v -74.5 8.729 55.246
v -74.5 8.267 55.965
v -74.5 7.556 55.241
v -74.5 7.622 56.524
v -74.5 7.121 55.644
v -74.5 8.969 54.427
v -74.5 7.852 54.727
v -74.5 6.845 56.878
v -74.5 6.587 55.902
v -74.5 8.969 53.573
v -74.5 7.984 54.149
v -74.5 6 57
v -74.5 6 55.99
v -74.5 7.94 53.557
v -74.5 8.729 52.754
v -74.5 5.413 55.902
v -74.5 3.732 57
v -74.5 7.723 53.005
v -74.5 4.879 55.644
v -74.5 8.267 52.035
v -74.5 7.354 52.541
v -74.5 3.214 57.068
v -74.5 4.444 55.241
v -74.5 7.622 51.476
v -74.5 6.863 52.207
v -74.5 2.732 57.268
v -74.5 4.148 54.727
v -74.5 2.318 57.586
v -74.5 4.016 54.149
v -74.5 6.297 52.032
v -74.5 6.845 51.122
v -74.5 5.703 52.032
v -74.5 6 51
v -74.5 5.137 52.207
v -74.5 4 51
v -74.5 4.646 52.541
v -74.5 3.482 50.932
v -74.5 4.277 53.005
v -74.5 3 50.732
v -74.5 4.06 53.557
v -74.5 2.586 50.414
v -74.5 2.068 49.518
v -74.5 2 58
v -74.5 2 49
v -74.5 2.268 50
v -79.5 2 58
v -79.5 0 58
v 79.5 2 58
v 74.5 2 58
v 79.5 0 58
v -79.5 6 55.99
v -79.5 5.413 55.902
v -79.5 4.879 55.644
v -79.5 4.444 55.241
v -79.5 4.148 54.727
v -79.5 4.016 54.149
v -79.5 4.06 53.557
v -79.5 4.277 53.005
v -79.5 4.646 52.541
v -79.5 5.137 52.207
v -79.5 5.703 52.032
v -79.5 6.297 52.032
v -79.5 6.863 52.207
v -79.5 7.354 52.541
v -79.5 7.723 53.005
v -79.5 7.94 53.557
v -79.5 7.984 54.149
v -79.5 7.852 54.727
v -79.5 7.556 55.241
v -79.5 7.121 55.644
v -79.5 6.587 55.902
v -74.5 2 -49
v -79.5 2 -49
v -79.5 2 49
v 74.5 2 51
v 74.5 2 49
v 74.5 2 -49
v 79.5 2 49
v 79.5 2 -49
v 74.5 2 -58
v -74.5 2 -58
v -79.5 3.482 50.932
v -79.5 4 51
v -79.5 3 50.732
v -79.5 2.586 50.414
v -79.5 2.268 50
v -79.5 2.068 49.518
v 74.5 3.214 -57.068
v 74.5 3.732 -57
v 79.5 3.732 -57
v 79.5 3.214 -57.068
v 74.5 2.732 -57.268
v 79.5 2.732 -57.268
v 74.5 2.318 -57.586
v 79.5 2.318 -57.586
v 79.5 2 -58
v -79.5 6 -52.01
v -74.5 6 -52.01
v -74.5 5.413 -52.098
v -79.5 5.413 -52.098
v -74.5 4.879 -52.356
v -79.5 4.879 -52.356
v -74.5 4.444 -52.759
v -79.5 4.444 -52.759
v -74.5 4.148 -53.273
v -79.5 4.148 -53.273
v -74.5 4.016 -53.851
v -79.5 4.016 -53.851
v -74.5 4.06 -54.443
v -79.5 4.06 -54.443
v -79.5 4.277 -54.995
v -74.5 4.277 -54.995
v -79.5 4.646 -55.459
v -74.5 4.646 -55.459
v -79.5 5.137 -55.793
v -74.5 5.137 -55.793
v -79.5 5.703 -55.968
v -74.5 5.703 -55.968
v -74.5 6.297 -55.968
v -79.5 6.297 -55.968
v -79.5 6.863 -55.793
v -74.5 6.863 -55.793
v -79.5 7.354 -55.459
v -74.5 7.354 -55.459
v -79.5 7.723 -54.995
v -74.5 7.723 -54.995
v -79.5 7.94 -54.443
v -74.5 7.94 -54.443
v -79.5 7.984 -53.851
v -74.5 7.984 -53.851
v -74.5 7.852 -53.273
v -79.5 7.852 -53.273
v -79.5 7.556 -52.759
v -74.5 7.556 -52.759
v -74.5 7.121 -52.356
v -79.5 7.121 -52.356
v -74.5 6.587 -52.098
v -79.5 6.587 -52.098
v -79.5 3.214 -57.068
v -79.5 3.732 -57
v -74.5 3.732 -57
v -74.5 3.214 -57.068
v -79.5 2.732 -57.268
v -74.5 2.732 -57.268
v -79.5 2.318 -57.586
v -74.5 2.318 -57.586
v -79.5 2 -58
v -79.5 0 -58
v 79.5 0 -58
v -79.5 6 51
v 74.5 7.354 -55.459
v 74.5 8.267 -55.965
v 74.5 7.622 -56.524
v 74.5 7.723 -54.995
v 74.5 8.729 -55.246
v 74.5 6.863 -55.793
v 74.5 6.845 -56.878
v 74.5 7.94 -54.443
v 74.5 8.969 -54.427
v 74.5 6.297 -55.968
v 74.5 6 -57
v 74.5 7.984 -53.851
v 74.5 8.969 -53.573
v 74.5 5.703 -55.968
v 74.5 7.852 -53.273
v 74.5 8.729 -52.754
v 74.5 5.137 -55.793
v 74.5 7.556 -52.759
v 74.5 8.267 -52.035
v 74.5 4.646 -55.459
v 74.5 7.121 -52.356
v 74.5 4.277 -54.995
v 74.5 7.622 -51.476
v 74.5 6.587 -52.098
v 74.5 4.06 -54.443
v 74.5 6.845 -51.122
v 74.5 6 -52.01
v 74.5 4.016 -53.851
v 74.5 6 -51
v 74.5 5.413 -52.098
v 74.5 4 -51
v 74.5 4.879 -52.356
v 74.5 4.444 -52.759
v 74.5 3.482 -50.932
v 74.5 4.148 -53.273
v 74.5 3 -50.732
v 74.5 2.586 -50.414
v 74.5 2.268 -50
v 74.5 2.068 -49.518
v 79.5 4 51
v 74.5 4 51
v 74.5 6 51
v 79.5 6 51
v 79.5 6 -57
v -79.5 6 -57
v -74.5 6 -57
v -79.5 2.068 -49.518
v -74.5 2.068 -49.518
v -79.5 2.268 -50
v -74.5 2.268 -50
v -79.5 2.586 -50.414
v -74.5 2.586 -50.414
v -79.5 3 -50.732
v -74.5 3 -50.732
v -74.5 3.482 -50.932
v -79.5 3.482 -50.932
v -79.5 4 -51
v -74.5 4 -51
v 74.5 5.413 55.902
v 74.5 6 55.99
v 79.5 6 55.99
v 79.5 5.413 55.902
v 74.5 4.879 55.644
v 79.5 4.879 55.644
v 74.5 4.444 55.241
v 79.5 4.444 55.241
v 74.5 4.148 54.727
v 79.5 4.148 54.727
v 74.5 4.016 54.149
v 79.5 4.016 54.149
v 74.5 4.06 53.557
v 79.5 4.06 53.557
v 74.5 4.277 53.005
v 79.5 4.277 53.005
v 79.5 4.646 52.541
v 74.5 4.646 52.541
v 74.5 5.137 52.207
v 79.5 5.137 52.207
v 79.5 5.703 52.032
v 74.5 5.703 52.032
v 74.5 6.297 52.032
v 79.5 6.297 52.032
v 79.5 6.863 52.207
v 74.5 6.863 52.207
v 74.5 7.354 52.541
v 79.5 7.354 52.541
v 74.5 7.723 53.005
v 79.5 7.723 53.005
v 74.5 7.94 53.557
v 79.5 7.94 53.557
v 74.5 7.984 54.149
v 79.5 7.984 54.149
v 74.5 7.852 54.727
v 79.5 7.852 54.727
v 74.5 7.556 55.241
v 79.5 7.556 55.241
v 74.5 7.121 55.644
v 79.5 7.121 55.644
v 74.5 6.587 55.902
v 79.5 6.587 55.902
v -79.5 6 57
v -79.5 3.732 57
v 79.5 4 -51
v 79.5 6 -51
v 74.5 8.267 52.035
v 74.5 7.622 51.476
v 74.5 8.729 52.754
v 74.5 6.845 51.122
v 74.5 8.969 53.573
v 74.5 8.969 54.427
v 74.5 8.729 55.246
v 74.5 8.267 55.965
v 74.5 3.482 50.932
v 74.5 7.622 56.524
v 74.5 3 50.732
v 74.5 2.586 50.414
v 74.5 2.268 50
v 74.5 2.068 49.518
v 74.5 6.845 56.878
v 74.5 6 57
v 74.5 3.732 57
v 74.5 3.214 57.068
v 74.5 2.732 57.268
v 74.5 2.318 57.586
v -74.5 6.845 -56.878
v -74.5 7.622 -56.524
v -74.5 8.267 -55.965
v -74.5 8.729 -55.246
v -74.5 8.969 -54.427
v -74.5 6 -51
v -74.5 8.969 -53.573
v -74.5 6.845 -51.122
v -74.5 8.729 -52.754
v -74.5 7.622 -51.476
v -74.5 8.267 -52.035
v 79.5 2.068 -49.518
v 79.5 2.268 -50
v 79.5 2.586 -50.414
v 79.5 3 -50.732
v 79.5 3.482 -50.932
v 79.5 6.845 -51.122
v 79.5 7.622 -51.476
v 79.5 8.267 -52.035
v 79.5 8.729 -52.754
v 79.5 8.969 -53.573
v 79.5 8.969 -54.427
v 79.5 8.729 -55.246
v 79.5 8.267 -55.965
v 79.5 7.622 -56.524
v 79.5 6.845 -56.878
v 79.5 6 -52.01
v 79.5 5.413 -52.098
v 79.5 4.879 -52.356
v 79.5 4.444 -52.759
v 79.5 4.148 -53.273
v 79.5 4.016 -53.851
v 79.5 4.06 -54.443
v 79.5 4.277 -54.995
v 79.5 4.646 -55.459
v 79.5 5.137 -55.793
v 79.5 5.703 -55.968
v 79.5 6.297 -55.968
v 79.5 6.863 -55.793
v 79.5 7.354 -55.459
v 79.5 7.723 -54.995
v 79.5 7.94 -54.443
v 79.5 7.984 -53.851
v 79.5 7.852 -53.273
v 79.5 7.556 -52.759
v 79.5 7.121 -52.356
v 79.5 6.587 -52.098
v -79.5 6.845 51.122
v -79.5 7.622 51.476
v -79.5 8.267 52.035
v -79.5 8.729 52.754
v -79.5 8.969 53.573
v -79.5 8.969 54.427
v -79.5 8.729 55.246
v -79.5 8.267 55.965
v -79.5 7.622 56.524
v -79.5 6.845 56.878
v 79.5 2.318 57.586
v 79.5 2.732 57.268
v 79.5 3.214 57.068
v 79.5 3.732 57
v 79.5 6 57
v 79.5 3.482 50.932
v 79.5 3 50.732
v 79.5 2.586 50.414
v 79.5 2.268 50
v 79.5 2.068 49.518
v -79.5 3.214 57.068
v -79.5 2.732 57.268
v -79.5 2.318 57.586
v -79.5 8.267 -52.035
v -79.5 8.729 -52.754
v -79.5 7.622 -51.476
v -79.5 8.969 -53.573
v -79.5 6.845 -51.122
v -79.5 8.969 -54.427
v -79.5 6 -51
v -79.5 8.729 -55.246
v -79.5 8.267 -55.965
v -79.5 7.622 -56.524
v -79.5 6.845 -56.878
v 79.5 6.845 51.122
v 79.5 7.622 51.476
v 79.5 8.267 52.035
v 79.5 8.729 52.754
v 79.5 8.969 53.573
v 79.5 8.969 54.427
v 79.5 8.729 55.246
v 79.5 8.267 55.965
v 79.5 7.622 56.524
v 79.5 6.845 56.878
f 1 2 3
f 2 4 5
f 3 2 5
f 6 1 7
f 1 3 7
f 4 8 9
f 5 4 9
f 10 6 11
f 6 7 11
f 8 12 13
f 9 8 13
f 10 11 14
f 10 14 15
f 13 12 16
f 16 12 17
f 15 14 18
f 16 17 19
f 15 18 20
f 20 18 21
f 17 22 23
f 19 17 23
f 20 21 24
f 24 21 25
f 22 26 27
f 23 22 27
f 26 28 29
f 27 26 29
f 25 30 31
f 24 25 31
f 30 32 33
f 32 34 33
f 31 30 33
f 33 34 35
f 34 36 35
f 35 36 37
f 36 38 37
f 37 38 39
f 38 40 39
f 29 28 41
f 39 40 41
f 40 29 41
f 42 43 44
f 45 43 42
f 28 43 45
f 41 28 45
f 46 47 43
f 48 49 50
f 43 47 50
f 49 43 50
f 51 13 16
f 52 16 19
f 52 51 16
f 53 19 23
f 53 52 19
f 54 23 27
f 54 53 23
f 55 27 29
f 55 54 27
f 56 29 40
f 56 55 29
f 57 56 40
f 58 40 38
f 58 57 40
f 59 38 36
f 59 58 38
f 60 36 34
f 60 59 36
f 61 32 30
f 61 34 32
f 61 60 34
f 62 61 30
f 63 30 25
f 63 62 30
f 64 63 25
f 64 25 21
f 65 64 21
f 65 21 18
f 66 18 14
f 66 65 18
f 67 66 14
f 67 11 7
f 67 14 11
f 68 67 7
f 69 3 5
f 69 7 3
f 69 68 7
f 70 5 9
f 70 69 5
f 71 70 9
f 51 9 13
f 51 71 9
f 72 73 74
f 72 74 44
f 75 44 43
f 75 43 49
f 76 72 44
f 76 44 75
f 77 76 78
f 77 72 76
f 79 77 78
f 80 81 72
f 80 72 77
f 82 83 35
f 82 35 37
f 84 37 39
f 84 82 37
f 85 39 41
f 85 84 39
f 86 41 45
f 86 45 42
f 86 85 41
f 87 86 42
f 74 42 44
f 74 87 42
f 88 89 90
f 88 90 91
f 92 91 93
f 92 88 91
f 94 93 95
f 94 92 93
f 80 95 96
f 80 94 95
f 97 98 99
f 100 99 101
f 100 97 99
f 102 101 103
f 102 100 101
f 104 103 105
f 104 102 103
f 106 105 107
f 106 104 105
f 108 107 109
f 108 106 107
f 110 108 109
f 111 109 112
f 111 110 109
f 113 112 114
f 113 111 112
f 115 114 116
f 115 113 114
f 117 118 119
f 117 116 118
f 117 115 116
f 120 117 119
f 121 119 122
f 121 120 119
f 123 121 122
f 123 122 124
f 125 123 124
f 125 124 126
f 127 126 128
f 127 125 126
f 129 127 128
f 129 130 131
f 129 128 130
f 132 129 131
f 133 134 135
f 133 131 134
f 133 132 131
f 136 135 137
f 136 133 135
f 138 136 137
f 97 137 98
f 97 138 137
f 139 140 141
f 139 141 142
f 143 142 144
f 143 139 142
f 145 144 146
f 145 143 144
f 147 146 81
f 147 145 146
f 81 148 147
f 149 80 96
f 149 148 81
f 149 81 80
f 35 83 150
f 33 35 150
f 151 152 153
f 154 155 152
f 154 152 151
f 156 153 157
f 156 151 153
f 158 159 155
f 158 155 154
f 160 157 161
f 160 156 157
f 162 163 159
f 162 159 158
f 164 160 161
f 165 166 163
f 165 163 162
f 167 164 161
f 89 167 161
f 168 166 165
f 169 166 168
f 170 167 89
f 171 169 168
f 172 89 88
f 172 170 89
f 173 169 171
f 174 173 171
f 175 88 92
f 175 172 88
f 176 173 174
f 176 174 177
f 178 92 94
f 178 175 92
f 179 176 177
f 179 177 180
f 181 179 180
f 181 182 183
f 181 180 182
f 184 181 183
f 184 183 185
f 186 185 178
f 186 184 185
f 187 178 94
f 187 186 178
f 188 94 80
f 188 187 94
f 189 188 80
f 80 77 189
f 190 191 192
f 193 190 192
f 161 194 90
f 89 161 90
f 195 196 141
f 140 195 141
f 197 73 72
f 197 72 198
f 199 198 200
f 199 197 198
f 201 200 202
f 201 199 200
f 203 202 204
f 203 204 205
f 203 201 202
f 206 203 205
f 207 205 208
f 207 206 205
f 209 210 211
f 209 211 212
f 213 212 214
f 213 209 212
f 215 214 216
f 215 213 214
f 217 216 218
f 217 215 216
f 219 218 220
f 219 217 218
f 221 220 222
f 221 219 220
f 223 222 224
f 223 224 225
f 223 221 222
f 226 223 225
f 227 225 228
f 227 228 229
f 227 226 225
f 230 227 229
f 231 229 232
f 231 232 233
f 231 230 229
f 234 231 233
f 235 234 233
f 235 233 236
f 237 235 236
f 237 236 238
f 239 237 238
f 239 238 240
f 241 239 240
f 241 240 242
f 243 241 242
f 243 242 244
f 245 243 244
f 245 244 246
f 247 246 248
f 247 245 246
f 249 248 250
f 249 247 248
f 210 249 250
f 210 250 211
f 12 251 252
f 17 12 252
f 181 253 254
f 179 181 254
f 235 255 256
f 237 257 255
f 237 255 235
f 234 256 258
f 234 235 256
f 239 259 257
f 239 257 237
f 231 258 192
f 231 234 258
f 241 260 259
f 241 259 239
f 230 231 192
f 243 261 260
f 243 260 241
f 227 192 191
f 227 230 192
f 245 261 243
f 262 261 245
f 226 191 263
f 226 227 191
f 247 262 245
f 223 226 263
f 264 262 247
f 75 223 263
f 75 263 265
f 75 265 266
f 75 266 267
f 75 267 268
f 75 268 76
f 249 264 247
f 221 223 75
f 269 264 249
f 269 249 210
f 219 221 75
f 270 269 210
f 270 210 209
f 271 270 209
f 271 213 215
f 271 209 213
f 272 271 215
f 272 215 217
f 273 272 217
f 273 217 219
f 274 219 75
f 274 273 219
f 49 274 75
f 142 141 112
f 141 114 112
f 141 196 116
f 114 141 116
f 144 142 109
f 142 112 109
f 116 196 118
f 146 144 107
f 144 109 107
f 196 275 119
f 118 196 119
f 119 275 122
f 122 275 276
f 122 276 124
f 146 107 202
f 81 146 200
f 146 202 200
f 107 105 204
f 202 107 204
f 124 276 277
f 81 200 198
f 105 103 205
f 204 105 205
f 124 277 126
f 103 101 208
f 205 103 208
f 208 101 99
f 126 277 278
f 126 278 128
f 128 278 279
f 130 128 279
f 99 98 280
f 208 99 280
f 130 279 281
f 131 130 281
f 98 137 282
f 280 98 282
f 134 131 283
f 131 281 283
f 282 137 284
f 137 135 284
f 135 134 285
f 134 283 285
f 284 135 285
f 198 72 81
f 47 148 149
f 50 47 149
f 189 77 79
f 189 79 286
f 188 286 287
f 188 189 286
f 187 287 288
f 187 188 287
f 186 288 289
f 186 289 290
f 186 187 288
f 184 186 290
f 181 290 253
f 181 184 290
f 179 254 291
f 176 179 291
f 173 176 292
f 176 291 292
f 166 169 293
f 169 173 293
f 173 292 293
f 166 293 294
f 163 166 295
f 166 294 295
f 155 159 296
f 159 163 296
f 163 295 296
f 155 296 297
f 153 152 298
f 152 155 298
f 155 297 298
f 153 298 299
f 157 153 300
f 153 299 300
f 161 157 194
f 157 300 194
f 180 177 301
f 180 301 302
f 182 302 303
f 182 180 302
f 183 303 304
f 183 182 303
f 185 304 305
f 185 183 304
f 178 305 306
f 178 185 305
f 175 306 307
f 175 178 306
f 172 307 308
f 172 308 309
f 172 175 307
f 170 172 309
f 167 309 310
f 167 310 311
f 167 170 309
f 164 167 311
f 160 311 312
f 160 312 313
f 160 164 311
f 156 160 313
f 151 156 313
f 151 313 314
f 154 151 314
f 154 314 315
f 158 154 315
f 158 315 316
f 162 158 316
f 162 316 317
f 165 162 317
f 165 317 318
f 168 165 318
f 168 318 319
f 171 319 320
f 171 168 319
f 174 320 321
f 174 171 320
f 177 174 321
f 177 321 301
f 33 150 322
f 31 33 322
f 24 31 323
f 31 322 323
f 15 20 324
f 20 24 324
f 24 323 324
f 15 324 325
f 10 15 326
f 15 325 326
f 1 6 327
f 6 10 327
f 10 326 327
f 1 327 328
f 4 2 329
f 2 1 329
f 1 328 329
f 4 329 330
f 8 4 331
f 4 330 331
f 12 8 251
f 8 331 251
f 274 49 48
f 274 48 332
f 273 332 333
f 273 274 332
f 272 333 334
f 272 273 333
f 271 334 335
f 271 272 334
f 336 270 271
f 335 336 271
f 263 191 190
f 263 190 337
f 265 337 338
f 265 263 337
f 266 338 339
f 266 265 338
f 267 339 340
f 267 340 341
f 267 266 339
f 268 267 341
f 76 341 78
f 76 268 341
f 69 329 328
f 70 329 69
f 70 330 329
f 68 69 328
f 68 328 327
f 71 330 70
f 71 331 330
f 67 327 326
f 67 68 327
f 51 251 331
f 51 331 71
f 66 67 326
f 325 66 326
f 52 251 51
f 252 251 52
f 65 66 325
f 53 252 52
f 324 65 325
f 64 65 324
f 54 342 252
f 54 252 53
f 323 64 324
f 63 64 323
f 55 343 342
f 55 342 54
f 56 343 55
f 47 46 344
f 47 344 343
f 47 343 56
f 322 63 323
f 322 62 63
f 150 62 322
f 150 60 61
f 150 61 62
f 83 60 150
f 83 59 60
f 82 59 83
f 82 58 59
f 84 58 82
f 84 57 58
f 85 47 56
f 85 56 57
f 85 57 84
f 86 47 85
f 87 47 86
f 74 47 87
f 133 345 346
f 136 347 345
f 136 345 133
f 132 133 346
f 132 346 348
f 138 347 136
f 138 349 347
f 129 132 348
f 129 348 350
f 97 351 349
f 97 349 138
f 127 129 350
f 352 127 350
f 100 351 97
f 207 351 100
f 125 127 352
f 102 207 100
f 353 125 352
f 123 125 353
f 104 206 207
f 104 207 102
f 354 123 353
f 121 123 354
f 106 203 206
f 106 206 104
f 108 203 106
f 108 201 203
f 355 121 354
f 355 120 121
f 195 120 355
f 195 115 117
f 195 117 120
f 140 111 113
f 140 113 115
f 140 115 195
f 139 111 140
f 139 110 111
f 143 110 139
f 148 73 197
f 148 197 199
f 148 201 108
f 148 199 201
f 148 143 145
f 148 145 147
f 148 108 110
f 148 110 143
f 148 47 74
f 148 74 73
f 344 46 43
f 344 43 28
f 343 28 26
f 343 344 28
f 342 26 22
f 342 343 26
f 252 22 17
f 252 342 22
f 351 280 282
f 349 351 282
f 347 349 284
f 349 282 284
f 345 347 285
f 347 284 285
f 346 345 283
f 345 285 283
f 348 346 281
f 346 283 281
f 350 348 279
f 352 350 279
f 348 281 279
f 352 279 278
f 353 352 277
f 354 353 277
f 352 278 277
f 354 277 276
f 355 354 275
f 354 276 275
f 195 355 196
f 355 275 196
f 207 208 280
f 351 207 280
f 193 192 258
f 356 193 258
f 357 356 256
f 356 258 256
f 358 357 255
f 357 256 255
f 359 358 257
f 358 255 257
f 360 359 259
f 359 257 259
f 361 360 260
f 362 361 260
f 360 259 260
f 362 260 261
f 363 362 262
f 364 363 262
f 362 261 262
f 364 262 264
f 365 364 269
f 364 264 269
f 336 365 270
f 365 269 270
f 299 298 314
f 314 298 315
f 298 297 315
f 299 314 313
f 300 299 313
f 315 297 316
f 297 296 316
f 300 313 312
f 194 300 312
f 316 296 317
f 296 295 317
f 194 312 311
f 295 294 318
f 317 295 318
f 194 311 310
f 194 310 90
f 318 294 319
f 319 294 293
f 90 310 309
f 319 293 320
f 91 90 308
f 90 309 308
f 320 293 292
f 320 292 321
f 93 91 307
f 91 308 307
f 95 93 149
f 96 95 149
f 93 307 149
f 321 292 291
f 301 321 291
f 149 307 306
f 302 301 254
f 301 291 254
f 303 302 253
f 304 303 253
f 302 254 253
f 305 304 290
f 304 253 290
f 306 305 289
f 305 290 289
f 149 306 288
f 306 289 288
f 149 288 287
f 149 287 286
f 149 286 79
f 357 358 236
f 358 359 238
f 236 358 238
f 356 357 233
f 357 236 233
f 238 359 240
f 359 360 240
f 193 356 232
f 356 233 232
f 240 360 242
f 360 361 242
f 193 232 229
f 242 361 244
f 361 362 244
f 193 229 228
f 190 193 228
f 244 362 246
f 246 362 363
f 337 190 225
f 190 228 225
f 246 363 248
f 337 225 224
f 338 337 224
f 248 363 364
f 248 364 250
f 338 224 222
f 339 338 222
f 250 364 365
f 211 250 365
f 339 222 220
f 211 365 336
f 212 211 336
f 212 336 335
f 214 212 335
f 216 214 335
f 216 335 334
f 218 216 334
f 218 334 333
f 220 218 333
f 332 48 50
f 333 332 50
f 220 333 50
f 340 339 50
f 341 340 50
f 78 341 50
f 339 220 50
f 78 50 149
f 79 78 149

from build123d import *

# Parameters (mm, degrees)
SKETCH_1_W          = 159
SKETCH_1_H          = 116
EXTRUDE_1_DEPTH     = 2
SKETCH_3_R          = 1.99
EXTRUDE_3_DEPTH     = 79.5
SKETCH_4_W          = 149
SKETCH_4_H          = 7
CUT_EXTRUDE_2_DEPTH = 79.5
FILLET_3_R          = 2


with BuildPart() as part:
    # 草图1 → 凸台-拉伸1 (new body)
    with BuildSketch(Plane(origin=(0, 0, 0), x_dir=(1, 0, 0), z_dir=(0, 1, 0))):
        Rectangle(SKETCH_1_W, SKETCH_1_H)
    extrude(amount=EXTRUDE_1_DEPTH)

    # 草图3 → 凸台-拉伸3 (add, symmetric)
    # profile 1 of 2: a face of its own
    with BuildSketch(Plane(origin=(0, 0, 0), x_dir=(0, 0, -1), z_dir=(1, 0, 0))):
        with BuildLine():
            Line((-57, 6), (-57, 2))
            Line((-57, 2), (-51, 2))
            Line((-51, 2), (-51, 6))
            ThreePointArc((-51, 6), (-54, 9), (-57, 6))
        make_face()
        with Locations(Location((-54, 6, 0), (0, 0, 180))):
            Circle(SKETCH_3_R, mode=Mode.SUBTRACT)
    # profile 2 of 2: a face of its own
    with BuildSketch(Plane(origin=(0, 0, 0), x_dir=(0, 0, -1), z_dir=(1, 0, 0))):
        with BuildLine():
            Line((51, 2), (51, 6))
            ThreePointArc((51, 6), (54, 9), (57, 6))
            Line((57, 6), (57, 2))
            Line((57, 2), (51, 2))
        make_face()
        with Locations(Location((54, 6, 0), (0, 0, 180))):
            Circle(SKETCH_3_R, mode=Mode.SUBTRACT)
    extrude(amount=EXTRUDE_3_DEPTH, both=True)

    # 草图4 → 切除-拉伸2 (cut, symmetric)
    with BuildSketch(Plane.XY):
        with Locations((0, 5.5)):
            Rectangle(SKETCH_4_W, SKETCH_4_H)
    extrude(amount=CUT_EXTRUDE_2_DEPTH, both=True, mode=Mode.SUBTRACT)

    # 圆角3
    # the kernel refuses this fillet: 2 mm, written as the material it adds along each edge
    with BuildSketch(Plane(origin=(74.5, 2, 57), x_dir=(0, 1, 0), z_dir=(1, 0, 0))) as fillet_3_piece_1:
        with BuildLine():
            CenterArc((1.732050808, 2), FILLET_3_R, 210, 60)
            Line((0, 1), (-0.034641016, 0.98))
            ThreePointArc((-0.034641016, 0.98), (-0.04, 0.5), (-0.04, 0))
            Line((-0.04, 0), (0, -0.04))
            Line((0, -0.04), (1.732050808, -0.04))
            Line((1.732050808, -0.04), (1.732050808, 0))
        make_face()
    extrude(amount=5)
    with BuildSketch(Plane(origin=(74.5, 2, 51), x_dir=(0, 1, 0), z_dir=(1, 0, 0)), Plane(origin=(-79.5, 2, -51), x_dir=(0, 0, 1), z_dir=(1, 0, 0))) as fillet_3_piece_2:
        with BuildLine():
            CenterArc((FILLET_3_R, -FILLET_3_R), FILLET_3_R, 90, 90)
            Line((0, -FILLET_3_R), (-FILLET_3_R * 0.02, -FILLET_3_R))
            Line((-FILLET_3_R * 0.02, -FILLET_3_R), (-FILLET_3_R * 0.02, FILLET_3_R * 0.02))
            Line((-FILLET_3_R * 0.02, FILLET_3_R * 0.02), (FILLET_3_R, FILLET_3_R * 0.02))
            Line((FILLET_3_R, FILLET_3_R * 0.02), (FILLET_3_R, 0))
        make_face()
    extrude(amount=5)
    with BuildSketch(Plane(origin=(74.5, 2, -51), x_dir=(0, 1, 0), z_dir=(1, 0, 0)), Plane(origin=(-79.5, 2, 51), x_dir=(0, 0, -1), z_dir=(1, 0, 0))) as fillet_3_piece_3:
        with BuildLine():
            CenterArc((FILLET_3_R, FILLET_3_R), FILLET_3_R, 180, 90)
            Line((0, FILLET_3_R), (-FILLET_3_R * 0.02, FILLET_3_R))
            Line((-FILLET_3_R * 0.02, FILLET_3_R), (-FILLET_3_R * 0.02, -FILLET_3_R * 0.02))
            Line((-FILLET_3_R * 0.02, -FILLET_3_R * 0.02), (FILLET_3_R, -FILLET_3_R * 0.02))
            Line((FILLET_3_R, -FILLET_3_R * 0.02), (FILLET_3_R, 0))
        make_face()
    extrude(amount=5)
    with BuildSketch(Plane(origin=(74.5, 2, -57), x_dir=(0, 1, 0), z_dir=(1, 0, 0))) as fillet_3_piece_4:
        with BuildLine():
            CenterArc((1.732050808, -2), FILLET_3_R, 90, 60)
            Line((0, -1), (-0.034641016, -0.98))
            ThreePointArc((-0.034641016, -0.98), (-0.04, -0.5), (-0.04, 0))
            Line((-0.04, 0), (0, 0.04))
            Line((0, 0.04), (1.732050808, 0.04))
            Line((1.732050808, 0.04), (1.732050808, 0))
        make_face()
    extrude(amount=5)
    with BuildSketch(Plane(origin=(-79.5, 2, -57), x_dir=(0, 0, -1), z_dir=(1, 0, 0))) as fillet_3_piece_5:
        with BuildLine():
            CenterArc((2, 1.732050808), FILLET_3_R, 180, 60)
            Line((0, 1.732050808), (-0.04, 1.732050808))
            Line((-0.04, 1.732050808), (-0.04, 0))
            Line((-0.04, 0), (0, -0.04))
            ThreePointArc((0, -0.04), (0.5, -0.04), (0.98, -0.034641016))
            Line((0.98, -0.034641016), (1, 0))
        make_face()
    extrude(amount=5)
    with BuildSketch(Plane(origin=(-79.5, 2, 57), x_dir=(0, 0, 1), z_dir=(1, 0, 0))) as fillet_3_piece_6:
        with BuildLine():
            CenterArc((2, -1.732050808), FILLET_3_R, 120, 60)
            Line((0, -1.732050808), (-0.04, -1.732050808))
            Line((-0.04, -1.732050808), (-0.04, 0))
            Line((-0.04, 0), (0, 0.04))
            ThreePointArc((0, 0.04), (0.5, 0.04), (0.98, 0.034641016))
            Line((0.98, 0.034641016), (1, 0))
        make_face()
    extrude(amount=5)


solid = part.part
